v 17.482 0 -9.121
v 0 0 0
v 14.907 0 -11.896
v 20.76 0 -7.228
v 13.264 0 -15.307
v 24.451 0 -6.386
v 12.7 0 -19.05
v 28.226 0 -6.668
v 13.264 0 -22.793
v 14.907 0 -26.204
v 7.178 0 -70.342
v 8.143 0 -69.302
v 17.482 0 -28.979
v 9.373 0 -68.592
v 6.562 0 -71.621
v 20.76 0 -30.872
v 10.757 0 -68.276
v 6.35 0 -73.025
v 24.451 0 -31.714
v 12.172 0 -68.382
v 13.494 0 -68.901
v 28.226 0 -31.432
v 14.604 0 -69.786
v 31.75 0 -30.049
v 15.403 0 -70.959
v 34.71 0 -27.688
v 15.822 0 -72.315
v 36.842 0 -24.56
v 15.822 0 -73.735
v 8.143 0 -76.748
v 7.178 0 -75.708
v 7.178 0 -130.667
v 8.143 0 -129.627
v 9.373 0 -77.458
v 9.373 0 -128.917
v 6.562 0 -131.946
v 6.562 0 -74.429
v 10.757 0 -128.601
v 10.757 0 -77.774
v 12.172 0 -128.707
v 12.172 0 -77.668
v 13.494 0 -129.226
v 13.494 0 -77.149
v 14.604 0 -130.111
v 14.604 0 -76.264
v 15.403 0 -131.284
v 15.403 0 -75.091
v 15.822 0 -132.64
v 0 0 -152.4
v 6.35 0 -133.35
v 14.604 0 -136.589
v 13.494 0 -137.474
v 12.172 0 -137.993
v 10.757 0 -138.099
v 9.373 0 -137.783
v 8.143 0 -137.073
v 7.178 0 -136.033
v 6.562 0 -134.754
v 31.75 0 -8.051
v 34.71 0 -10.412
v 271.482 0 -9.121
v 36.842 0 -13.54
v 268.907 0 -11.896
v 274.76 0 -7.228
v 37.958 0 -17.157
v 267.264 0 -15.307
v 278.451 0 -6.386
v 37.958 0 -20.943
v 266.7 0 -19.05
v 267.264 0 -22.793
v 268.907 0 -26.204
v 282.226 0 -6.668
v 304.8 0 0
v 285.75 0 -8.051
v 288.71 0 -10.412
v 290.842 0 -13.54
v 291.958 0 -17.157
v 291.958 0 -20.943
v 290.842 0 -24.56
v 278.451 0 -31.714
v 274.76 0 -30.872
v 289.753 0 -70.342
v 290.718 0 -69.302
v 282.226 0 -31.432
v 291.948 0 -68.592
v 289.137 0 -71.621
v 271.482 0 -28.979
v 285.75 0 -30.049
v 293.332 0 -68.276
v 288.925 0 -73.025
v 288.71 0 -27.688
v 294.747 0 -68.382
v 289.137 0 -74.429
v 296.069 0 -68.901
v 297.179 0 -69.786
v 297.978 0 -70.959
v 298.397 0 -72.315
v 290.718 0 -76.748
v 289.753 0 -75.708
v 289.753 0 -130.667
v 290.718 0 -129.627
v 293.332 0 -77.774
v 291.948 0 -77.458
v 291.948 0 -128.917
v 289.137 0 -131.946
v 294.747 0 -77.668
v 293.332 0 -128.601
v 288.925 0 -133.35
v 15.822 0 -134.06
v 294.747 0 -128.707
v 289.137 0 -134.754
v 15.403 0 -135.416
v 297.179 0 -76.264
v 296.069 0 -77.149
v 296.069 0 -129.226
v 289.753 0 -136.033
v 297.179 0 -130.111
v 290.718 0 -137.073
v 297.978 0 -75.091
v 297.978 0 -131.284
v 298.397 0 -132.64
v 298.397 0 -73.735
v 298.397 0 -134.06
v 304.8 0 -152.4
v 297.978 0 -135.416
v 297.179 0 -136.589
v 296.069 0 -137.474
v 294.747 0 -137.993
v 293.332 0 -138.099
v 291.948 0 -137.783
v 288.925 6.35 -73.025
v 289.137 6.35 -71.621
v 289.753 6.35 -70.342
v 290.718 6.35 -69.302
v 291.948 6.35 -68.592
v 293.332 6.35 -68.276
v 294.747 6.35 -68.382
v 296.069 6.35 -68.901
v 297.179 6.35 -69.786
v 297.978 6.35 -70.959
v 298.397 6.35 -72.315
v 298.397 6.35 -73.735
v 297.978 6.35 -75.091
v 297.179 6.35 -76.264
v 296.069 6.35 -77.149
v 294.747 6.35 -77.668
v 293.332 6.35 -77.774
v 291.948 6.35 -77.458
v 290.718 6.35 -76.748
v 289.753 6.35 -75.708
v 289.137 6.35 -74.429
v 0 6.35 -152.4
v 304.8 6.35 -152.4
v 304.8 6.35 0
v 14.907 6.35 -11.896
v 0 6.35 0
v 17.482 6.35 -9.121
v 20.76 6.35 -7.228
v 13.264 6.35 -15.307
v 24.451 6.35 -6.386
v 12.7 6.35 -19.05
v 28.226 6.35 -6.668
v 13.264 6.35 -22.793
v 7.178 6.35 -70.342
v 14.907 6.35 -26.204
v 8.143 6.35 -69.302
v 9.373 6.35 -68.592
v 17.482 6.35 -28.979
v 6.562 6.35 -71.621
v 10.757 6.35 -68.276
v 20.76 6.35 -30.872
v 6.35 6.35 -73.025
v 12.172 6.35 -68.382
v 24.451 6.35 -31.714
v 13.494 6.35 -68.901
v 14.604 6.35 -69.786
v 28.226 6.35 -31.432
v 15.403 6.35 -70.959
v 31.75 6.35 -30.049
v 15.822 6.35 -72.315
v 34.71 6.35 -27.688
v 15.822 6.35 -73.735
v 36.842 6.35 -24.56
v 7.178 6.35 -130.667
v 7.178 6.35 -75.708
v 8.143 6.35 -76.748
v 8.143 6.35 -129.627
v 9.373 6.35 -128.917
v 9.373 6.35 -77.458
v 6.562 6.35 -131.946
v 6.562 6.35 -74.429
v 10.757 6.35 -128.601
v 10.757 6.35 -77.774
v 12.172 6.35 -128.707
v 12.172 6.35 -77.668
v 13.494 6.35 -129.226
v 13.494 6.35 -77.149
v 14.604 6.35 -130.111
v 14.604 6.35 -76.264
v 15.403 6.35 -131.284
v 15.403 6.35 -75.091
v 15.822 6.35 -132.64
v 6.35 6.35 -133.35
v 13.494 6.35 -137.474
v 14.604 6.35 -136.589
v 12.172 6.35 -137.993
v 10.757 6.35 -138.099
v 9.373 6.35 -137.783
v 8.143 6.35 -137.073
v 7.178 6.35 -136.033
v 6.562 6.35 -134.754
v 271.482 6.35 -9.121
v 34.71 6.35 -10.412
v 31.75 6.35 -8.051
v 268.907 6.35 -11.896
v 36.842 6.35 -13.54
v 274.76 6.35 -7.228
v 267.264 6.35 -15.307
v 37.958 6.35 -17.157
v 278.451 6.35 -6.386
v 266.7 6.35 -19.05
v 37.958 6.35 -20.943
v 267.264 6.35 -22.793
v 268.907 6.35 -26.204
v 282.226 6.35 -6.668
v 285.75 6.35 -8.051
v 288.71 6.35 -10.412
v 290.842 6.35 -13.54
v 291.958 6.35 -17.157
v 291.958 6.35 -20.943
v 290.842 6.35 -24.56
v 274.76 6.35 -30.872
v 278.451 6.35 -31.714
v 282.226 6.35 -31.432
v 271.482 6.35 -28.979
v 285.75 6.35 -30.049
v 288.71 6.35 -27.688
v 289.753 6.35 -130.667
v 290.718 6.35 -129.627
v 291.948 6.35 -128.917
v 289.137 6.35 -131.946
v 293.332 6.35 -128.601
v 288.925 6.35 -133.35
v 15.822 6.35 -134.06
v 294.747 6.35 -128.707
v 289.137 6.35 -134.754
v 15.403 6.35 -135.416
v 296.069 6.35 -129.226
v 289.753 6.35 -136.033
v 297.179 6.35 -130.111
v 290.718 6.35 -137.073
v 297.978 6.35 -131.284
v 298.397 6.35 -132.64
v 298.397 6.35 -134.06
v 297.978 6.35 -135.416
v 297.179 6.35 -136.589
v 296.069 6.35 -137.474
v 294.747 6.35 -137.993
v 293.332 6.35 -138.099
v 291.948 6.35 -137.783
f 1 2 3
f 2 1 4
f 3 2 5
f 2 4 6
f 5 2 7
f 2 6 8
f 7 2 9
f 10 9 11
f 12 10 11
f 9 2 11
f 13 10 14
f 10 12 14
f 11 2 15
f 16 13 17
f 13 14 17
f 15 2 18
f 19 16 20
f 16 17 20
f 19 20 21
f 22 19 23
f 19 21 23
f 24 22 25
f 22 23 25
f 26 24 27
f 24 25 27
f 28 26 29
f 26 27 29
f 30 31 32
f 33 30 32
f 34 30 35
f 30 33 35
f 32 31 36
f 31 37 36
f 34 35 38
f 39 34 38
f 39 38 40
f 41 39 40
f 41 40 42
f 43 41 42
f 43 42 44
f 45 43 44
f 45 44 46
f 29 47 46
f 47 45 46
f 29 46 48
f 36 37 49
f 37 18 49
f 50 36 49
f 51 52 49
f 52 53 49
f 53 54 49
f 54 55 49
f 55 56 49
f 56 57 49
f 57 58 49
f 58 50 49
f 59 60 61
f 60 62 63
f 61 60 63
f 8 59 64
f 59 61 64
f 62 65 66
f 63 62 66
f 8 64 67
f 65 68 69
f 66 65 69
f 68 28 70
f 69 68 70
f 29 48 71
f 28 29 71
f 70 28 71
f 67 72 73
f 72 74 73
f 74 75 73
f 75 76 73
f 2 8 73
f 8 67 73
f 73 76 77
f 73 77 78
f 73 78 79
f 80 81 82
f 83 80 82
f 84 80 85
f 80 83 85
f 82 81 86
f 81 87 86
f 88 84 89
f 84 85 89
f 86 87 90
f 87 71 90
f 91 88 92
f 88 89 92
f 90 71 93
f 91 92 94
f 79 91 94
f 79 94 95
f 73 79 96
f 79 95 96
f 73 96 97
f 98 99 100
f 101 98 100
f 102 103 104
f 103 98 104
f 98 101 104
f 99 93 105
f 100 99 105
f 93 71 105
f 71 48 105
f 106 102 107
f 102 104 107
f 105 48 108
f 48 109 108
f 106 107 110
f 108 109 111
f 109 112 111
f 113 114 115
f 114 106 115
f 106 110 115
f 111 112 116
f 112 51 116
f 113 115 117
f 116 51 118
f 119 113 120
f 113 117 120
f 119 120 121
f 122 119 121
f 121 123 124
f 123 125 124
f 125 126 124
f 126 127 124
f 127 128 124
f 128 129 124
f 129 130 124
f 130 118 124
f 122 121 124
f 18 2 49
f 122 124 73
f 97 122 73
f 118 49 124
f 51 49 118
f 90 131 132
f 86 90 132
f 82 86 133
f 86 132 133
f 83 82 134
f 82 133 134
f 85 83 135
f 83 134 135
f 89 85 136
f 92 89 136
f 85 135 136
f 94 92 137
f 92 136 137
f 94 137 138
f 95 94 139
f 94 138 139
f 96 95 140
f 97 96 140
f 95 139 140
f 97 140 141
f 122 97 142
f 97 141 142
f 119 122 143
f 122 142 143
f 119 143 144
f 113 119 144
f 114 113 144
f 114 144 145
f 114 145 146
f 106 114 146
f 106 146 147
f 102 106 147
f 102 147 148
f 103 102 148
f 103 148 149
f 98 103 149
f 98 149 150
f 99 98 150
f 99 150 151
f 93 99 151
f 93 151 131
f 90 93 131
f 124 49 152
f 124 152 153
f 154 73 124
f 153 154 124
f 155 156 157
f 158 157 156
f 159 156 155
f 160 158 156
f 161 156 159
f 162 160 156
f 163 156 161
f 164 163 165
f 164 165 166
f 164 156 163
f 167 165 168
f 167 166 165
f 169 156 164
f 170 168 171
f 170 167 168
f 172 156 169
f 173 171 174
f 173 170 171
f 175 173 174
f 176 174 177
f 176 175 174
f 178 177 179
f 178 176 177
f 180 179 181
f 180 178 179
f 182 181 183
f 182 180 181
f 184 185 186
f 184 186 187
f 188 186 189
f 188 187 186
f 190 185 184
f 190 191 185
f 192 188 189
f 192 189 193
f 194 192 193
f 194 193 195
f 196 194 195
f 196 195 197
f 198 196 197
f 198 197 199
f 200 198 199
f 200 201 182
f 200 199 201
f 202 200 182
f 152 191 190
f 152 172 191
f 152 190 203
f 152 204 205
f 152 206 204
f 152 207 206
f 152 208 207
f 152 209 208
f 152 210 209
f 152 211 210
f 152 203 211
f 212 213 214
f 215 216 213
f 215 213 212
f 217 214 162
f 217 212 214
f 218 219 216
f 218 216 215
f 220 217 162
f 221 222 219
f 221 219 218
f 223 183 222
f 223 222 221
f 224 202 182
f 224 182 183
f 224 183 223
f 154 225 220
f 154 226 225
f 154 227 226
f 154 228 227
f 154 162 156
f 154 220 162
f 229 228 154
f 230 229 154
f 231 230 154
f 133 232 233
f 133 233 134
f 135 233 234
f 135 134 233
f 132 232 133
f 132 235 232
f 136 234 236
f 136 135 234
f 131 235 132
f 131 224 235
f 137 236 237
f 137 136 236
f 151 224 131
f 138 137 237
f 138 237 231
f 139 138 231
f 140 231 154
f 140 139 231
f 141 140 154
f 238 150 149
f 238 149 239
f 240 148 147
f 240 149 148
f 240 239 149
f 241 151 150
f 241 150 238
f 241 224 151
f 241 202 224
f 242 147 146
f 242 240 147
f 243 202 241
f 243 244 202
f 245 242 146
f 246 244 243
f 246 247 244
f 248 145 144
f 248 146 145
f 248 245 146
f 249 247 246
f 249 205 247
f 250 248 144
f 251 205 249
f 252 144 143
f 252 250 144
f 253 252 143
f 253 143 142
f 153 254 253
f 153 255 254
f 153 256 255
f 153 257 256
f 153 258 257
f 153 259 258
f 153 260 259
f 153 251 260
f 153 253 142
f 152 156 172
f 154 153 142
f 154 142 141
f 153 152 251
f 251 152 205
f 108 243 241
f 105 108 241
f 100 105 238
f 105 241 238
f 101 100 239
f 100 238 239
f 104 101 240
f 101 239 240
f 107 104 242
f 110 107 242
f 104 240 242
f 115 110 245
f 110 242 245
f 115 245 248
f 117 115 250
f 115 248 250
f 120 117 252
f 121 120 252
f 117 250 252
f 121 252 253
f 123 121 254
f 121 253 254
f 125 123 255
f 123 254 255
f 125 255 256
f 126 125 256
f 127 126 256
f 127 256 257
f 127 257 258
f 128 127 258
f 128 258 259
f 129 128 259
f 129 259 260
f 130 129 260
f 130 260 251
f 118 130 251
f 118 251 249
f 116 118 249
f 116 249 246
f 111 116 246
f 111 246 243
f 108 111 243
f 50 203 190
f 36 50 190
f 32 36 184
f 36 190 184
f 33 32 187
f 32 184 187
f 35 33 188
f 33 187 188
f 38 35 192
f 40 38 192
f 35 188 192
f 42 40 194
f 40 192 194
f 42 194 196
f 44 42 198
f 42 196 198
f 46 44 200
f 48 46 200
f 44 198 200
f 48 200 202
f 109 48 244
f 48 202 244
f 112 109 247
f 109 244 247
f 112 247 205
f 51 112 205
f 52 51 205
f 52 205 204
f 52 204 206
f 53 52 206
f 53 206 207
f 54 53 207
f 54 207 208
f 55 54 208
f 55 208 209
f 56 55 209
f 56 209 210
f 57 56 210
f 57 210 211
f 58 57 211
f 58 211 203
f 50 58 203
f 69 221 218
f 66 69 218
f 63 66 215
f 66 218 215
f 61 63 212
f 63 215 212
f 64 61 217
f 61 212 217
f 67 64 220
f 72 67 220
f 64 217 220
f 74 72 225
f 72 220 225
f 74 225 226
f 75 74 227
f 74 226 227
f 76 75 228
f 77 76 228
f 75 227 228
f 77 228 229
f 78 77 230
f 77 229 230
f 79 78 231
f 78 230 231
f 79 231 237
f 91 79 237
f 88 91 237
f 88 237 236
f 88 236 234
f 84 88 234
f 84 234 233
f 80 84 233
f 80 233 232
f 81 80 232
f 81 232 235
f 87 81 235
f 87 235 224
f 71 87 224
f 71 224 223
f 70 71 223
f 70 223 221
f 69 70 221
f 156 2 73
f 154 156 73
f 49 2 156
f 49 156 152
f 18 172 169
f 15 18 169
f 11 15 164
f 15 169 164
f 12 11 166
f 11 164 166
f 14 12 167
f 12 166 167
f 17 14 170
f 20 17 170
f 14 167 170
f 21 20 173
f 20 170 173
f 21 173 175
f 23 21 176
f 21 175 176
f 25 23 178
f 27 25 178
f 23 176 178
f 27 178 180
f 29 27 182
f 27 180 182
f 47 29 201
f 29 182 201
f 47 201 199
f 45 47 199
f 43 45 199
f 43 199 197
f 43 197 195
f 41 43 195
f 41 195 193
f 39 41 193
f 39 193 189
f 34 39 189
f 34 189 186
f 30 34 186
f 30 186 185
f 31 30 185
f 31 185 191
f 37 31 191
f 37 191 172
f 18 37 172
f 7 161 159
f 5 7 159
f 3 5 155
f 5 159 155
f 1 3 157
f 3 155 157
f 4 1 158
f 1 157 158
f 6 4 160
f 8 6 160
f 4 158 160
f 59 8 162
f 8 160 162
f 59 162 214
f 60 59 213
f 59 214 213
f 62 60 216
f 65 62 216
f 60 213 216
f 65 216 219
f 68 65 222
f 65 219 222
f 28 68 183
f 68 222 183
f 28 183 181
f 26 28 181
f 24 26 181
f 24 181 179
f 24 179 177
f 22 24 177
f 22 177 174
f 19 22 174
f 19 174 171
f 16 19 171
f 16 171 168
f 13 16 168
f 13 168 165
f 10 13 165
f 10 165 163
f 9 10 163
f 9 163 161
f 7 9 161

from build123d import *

# Parameters (mm, degrees)
SKETCH1_W           = 304.8
SKETCH1_H           = 152.4
BOSS_EXTRUDE1_DEPTH = 6.35
CUT_EXTRUDE1_REACH  = 8.35
SKETCH2_R           = 12.7
SKETCH2_R_2         = 4.7625


with BuildPart() as part:
    # Sketch1 → Boss-Extrude1 (new body)
    with BuildSketch(Plane(origin=(0, 0, 0), x_dir=(1, 0, 0), z_dir=(0, 1, 0))):
        with Locations((152.4, 76.2)):
            Rectangle(SKETCH1_W, SKETCH1_H)
    extrude(amount=BOSS_EXTRUDE1_DEPTH)

    # Sketch2 → Cut-Extrude1 (cut, up to next)
    with BuildSketch(Plane(origin=(0, 6.35, 0), x_dir=(-1, 0, 0), z_dir=(0, 1, 0)), mode=Mode.PRIVATE) as cut_extrude1_sk1:
        with Locations((-25.4, -19.05)):
            Circle(SKETCH2_R)
    cut_extrude1_tool1 = extrude(cut_extrude1_sk1.sketch, amount=-CUT_EXTRUDE1_REACH, mode=Mode.PRIVATE) & part.part
    add(cut_extrude1_tool1.solids().sort_by_distance((25.4, 6.35, -19.05))[0], mode=Mode.SUBTRACT)
    # Sketch2 → Cut-Extrude1 (cut, up to next)
    with BuildSketch(Plane(origin=(0, 6.35, 0), x_dir=(-1, 0, 0), z_dir=(0, 1, 0)), mode=Mode.PRIVATE) as cut_extrude1_sk2:
        with Locations((-293.6875, -133.35)):
            Circle(SKETCH2_R_2)
    cut_extrude1_tool2 = extrude(cut_extrude1_sk2.sketch, amount=-CUT_EXTRUDE1_REACH, mode=Mode.PRIVATE) & part.part
    add(cut_extrude1_tool2.solids().sort_by_distance((293.6875, 6.35, -133.35))[0], mode=Mode.SUBTRACT)
    # Sketch2 → Cut-Extrude1 (cut, up to next)
    with BuildSketch(Plane(origin=(0, 6.35, 0), x_dir=(-1, 0, 0), z_dir=(0, 1, 0)), mode=Mode.PRIVATE) as cut_extrude1_sk3:
        with Locations((-11.1125, -133.35)):
            Circle(SKETCH2_R_2)
    cut_extrude1_tool3 = extrude(cut_extrude1_sk3.sketch, amount=-CUT_EXTRUDE1_REACH, mode=Mode.PRIVATE) & part.part
    add(cut_extrude1_tool3.solids().sort_by_distance((11.1125, 6.35, -133.35))[0], mode=Mode.SUBTRACT)
    # Sketch2 → Cut-Extrude1 (cut, up to next)
    with BuildSketch(Plane(origin=(0, 6.35, 0), x_dir=(-1, 0, 0), z_dir=(0, 1, 0)), mode=Mode.PRIVATE) as cut_extrude1_sk4:
        with Locations((-11.1125, -73.025)):
            Circle(SKETCH2_R_2)
    cut_extrude1_tool4 = extrude(cut_extrude1_sk4.sketch, amount=-CUT_EXTRUDE1_REACH, mode=Mode.PRIVATE) & part.part
    add(cut_extrude1_tool4.solids().sort_by_distance((11.1125, 6.35, -73.025))[0], mode=Mode.SUBTRACT)
    # Sketch2 → Cut-Extrude1 (cut, up to next)
    with BuildSketch(Plane(origin=(0, 6.35, 0), x_dir=(-1, 0, 0), z_dir=(0, 1, 0)), mode=Mode.PRIVATE) as cut_extrude1_sk5:
        with Locations((-293.6875, -73.025)):
            Circle(SKETCH2_R_2)
    cut_extrude1_tool5 = extrude(cut_extrude1_sk5.sketch, amount=-CUT_EXTRUDE1_REACH, mode=Mode.PRIVATE) & part.part
    add(cut_extrude1_tool5.solids().sort_by_distance((293.6875, 6.35, -73.025))[0], mode=Mode.SUBTRACT)
    # Sketch2 → Cut-Extrude1 (cut, up to next)
    with BuildSketch(Plane(origin=(0, 6.35, 0), x_dir=(-1, 0, 0), z_dir=(0, 1, 0)), mode=Mode.PRIVATE) as cut_extrude1_sk6:
        with Locations((-279.4, -19.05)):
            Circle(SKETCH2_R)
    cut_extrude1_tool6 = extrude(cut_extrude1_sk6.sketch, amount=-CUT_EXTRUDE1_REACH, mode=Mode.PRIVATE) & part.part
    add(cut_extrude1_tool6.solids().sort_by_distance((279.4, 6.35, -19.05))[0], mode=Mode.SUBTRACT)


solid = part.part
